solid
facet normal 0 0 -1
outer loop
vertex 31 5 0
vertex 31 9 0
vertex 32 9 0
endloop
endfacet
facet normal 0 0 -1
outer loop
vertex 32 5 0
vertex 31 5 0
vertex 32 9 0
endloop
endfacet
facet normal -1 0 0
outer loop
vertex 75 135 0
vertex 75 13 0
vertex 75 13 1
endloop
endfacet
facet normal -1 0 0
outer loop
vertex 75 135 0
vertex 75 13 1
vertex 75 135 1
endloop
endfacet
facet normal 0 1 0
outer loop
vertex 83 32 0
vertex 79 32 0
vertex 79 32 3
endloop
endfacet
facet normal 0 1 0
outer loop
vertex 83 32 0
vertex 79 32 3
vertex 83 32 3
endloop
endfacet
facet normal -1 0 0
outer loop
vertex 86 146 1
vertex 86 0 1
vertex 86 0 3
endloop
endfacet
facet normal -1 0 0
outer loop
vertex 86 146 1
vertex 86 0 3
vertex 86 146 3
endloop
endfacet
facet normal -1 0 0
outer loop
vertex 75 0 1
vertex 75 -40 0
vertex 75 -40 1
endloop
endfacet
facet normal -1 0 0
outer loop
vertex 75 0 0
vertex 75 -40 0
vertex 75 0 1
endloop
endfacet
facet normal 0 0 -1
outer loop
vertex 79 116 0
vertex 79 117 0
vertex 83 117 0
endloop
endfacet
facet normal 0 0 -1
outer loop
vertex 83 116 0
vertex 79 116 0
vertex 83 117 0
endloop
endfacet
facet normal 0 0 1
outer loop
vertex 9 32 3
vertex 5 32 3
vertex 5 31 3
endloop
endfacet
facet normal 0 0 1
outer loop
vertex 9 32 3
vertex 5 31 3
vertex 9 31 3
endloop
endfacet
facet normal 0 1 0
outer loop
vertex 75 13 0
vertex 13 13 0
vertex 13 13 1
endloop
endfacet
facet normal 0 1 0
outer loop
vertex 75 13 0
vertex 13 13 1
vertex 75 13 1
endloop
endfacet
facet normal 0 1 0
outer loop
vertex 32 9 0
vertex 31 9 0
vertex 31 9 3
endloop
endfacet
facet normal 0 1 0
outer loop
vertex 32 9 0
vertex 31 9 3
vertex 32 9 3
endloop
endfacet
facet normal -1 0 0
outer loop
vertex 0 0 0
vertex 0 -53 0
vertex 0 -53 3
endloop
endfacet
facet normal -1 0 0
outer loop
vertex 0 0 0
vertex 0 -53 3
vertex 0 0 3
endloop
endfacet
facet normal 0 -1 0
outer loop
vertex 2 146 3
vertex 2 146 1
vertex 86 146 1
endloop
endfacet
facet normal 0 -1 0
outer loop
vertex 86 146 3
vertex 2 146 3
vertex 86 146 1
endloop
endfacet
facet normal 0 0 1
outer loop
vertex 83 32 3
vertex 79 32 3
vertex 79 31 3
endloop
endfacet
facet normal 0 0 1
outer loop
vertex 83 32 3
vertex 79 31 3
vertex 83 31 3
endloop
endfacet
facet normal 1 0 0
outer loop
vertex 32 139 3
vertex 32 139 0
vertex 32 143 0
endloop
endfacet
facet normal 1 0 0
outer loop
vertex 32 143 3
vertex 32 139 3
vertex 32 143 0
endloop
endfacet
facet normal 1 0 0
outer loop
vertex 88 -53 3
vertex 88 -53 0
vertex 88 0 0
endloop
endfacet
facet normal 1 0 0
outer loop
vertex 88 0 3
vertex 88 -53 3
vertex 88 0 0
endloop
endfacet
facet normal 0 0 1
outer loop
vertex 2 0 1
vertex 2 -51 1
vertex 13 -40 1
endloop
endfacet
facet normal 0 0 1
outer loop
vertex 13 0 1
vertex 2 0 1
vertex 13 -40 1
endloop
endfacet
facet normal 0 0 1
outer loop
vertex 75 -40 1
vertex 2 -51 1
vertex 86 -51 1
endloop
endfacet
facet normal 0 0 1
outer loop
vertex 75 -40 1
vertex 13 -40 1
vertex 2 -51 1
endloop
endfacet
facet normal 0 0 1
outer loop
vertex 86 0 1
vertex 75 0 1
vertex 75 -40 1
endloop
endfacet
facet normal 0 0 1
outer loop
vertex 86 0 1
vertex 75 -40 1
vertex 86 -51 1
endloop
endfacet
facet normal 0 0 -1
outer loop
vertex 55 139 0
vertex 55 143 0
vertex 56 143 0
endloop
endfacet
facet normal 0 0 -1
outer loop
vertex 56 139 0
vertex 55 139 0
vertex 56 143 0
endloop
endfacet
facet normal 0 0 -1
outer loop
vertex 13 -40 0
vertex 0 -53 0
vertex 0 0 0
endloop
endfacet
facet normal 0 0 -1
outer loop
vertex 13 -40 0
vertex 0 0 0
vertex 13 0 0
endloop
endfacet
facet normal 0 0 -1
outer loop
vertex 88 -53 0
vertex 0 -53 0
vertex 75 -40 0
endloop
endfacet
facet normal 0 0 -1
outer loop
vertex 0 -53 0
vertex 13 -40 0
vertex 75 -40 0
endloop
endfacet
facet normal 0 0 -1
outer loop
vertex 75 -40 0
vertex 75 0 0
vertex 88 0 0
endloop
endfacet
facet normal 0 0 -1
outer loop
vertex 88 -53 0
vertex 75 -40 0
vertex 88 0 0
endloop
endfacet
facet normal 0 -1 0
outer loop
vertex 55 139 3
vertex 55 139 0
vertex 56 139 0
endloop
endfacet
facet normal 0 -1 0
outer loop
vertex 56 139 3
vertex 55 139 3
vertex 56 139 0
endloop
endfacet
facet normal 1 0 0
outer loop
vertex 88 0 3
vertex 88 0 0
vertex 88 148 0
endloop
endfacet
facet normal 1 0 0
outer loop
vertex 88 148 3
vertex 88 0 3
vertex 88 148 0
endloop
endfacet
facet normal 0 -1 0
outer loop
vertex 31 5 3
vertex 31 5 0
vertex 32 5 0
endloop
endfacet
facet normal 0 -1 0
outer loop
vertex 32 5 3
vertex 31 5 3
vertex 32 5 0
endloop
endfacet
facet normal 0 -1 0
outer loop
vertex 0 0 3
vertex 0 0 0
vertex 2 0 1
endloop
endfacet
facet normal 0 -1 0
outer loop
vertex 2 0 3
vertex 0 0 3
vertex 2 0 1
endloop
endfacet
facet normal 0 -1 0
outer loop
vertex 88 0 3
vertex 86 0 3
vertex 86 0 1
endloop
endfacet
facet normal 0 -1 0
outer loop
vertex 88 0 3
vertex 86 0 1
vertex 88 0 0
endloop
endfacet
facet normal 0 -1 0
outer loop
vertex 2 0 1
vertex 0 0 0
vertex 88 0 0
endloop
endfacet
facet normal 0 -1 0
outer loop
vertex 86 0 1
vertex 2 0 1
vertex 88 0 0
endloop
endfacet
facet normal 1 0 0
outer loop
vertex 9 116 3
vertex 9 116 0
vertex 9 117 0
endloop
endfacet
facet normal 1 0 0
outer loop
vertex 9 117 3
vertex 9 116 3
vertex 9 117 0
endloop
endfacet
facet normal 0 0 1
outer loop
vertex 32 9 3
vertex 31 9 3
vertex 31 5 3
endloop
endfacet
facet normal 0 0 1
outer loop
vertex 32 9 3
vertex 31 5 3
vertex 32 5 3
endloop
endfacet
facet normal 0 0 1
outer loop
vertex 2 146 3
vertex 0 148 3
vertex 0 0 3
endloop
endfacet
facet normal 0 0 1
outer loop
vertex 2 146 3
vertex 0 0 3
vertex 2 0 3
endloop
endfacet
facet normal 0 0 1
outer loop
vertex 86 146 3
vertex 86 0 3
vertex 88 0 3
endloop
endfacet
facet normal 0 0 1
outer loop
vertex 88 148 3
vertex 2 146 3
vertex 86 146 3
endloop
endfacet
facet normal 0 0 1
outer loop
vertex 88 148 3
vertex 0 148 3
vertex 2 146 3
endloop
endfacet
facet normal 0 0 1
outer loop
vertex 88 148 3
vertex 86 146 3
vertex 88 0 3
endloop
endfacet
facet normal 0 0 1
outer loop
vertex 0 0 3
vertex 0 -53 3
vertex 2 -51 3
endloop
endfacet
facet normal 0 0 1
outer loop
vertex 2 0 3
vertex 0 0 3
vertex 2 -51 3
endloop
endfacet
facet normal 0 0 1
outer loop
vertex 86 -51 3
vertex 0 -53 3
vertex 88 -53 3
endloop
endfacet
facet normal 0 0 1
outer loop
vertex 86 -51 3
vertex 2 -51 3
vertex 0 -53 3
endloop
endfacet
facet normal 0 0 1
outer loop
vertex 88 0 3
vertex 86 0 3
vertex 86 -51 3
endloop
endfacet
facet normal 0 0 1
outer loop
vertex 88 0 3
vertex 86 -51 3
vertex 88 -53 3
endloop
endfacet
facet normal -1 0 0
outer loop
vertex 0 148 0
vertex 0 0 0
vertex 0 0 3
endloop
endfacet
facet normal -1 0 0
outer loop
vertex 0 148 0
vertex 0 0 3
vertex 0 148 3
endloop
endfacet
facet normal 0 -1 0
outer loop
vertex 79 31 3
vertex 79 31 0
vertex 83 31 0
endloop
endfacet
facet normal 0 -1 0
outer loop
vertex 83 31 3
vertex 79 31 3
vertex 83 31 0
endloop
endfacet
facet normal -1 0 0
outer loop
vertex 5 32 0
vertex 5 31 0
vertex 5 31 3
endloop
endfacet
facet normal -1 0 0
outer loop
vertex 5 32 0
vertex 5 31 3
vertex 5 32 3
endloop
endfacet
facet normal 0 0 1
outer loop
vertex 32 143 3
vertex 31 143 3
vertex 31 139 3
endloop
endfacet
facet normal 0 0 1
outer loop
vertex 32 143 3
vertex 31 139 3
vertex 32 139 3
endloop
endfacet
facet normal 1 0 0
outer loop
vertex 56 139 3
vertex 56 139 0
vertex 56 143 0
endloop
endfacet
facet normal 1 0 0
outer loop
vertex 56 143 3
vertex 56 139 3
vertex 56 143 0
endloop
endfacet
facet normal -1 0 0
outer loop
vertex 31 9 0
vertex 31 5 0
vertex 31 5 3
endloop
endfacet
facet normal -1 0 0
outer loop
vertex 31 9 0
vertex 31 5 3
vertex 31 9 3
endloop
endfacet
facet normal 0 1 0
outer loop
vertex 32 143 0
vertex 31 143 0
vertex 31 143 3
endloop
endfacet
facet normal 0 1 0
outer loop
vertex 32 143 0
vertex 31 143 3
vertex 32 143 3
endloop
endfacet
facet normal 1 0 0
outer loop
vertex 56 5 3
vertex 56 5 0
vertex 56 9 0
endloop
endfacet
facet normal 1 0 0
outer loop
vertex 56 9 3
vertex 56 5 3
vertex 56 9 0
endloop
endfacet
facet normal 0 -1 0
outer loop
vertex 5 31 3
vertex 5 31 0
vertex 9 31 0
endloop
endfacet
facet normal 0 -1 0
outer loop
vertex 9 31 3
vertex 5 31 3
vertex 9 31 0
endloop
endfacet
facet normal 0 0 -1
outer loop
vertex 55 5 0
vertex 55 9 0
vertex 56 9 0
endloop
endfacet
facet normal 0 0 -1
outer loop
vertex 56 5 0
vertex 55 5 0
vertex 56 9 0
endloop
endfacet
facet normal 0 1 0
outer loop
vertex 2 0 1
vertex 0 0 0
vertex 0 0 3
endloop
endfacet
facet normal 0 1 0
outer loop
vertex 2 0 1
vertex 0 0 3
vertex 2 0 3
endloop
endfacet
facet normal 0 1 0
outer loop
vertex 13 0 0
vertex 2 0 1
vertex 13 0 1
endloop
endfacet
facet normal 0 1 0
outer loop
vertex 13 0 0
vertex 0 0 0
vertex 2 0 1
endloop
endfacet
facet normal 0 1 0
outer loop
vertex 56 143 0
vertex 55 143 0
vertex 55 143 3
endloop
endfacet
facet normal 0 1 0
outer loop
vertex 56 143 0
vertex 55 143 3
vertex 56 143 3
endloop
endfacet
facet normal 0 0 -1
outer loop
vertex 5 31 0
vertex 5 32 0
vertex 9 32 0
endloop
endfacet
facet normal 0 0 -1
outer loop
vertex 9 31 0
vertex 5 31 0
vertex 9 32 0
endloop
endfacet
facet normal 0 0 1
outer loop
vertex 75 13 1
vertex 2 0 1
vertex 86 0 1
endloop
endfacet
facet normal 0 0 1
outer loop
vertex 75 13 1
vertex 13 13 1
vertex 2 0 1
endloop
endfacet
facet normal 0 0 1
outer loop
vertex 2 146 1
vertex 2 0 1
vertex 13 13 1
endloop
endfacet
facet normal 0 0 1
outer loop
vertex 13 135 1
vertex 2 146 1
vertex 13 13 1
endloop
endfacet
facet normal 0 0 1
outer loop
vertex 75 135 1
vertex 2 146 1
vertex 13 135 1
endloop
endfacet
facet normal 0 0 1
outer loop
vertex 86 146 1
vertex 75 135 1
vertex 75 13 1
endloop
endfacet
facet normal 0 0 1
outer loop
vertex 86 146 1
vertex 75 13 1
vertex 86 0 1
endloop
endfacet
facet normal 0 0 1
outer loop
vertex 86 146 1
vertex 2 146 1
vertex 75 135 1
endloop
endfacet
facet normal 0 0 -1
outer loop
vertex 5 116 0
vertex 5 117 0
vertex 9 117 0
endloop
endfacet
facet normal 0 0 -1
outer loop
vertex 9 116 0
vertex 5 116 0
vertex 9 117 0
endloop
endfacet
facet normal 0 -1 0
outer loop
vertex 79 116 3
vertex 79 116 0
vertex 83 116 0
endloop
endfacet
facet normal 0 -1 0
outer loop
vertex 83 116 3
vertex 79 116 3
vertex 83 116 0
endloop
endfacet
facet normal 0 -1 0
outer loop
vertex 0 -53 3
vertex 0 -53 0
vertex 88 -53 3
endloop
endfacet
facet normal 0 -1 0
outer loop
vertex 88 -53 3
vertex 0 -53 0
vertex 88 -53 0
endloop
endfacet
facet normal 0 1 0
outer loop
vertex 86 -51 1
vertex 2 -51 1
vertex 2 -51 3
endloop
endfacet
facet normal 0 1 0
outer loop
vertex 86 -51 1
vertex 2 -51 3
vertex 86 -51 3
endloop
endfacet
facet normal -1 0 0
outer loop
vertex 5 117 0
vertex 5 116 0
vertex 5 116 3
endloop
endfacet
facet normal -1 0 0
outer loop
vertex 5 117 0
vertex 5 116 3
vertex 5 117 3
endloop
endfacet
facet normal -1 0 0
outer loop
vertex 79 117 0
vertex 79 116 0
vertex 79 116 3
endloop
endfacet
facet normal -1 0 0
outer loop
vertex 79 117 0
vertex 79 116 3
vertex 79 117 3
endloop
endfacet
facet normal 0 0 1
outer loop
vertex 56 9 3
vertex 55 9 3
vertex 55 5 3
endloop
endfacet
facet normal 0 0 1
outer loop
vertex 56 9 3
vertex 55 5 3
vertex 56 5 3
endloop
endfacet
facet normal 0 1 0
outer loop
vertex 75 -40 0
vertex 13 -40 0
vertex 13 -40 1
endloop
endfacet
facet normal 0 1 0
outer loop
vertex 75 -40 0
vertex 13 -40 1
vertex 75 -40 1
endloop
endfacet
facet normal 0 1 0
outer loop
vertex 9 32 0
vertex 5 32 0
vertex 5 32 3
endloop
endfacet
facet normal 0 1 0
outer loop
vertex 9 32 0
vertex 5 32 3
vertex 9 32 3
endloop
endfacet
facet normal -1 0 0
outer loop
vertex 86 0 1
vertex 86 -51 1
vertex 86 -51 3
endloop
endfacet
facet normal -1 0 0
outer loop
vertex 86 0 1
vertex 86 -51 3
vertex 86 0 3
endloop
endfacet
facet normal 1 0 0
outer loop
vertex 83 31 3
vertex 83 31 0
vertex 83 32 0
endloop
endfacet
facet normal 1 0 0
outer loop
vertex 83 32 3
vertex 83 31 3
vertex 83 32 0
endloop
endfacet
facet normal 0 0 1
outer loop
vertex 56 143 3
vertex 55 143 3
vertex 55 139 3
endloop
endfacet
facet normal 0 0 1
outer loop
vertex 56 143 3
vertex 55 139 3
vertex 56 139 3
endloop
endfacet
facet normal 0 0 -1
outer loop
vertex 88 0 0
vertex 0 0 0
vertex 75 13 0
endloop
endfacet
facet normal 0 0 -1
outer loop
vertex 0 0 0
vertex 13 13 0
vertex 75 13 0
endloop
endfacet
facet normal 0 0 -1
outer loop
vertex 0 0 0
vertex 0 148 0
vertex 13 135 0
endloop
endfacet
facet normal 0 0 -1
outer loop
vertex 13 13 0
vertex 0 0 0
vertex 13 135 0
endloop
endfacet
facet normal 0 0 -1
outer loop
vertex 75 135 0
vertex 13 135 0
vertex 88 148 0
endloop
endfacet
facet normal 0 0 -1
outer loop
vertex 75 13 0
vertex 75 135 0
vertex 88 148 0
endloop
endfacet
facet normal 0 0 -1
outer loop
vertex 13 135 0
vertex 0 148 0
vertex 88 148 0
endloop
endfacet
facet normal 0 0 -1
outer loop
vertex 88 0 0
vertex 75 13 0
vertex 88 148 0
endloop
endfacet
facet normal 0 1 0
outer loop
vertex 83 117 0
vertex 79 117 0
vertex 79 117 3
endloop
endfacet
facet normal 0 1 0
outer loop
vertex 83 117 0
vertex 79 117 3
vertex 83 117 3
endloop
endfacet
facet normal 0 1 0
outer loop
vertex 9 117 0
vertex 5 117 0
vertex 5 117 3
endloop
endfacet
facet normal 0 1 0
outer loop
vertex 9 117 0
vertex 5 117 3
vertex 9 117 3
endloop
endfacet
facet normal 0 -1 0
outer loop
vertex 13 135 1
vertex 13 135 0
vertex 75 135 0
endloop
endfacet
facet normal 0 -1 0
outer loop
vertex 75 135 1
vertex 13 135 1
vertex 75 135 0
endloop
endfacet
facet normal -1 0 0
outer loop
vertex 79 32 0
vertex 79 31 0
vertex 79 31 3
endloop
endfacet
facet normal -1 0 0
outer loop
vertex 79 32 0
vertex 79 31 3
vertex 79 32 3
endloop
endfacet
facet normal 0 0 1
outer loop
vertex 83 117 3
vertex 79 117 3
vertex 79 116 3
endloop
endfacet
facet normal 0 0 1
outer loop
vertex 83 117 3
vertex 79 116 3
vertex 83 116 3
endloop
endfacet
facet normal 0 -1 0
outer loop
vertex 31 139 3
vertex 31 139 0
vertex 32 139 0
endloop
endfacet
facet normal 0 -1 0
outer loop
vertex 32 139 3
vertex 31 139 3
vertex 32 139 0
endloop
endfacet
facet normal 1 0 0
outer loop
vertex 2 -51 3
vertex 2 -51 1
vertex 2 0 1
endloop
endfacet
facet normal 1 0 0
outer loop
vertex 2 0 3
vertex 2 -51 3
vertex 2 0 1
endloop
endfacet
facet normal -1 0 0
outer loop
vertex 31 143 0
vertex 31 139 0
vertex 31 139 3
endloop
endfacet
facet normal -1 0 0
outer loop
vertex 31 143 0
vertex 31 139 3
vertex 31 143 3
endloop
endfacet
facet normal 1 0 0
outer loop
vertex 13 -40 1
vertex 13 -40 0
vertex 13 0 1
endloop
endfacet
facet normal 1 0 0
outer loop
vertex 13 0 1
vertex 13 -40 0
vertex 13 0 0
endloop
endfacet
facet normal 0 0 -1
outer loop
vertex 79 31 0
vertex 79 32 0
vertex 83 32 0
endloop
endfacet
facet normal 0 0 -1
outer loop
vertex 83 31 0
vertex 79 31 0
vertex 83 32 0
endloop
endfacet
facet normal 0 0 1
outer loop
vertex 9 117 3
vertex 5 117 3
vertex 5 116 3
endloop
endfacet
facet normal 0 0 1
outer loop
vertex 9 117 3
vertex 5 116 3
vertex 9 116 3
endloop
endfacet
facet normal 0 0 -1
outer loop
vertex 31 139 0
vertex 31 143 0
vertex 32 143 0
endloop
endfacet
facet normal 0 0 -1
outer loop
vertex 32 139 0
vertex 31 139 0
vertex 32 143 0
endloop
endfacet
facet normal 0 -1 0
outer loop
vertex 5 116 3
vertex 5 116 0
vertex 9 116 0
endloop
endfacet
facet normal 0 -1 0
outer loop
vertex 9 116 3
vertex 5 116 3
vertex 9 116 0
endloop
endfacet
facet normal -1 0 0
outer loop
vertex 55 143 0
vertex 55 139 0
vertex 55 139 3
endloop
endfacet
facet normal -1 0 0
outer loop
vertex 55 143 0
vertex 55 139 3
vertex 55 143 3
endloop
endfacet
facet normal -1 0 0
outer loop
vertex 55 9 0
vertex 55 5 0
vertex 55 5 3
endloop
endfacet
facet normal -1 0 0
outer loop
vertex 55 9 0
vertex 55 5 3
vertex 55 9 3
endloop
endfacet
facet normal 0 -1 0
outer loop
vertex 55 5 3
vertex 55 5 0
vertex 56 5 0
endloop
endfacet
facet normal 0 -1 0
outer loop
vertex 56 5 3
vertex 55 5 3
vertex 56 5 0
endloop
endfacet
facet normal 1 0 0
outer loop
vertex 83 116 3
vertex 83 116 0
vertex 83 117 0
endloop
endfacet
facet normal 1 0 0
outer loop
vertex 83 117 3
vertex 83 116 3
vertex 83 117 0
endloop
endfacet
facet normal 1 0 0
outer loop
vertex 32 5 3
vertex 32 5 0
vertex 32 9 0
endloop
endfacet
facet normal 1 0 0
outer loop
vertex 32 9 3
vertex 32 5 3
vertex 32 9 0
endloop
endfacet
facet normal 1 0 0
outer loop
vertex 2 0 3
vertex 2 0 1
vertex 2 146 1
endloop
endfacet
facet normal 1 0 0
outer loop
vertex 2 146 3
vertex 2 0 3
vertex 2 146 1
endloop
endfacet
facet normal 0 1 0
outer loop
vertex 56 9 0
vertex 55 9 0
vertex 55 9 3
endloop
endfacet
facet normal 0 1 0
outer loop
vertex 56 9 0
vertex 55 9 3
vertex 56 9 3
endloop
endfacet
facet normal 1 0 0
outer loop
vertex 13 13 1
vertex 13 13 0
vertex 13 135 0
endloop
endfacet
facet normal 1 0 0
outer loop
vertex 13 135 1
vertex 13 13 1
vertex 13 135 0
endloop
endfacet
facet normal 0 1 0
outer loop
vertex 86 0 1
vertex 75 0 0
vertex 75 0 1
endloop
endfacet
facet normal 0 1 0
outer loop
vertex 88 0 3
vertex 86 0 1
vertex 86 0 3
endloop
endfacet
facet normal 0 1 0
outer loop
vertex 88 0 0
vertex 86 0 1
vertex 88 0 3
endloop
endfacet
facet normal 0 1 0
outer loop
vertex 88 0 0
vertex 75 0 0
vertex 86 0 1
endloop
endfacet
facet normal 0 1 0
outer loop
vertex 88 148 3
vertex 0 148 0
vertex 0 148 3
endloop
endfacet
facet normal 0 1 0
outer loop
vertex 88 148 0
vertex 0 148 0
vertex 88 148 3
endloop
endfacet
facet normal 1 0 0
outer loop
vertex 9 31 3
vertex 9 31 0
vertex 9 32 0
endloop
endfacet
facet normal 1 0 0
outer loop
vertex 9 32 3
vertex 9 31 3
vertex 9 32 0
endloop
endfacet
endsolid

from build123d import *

# Parameters (mm, degrees)
BOX003_W     = 4
BOX003_H     = 1
BOX003_DEPTH = 3
BOX004_W     = 4
BOX004_H     = 1
BOX004_DEPTH = 3
BOX005_W     = 4
BOX005_H     = 1
BOX005_DEPTH = 3
BOX006_W     = 4
BOX006_H     = 1
BOX006_DEPTH = 3
BOX007_W     = 1
BOX007_H     = 4
BOX007_DEPTH = 3
BOX008_W     = 1
BOX008_H     = 4
BOX008_DEPTH = 3
BOX009_W     = 1
BOX009_H     = 4
BOX009_DEPTH = 3
BOX010_W     = 1
BOX010_H     = 4
BOX010_DEPTH = 3
BOX012_W     = 84
BOX012_H     = 53
BOX012_DEPTH = 2
BOX002_W     = 84
BOX002_H     = 144
BOX002_DEPTH = 2
BOX001_W     = 62
BOX001_H     = 122
BOX001_DEPTH = 3
BOX_W        = 88
BOX_H        = 148
BOX_DEPTH    = 3
BOX013_W     = 62
BOX013_H     = 40
BOX013_DEPTH = 3
BOX011_W     = 88
BOX011_H     = 53
BOX011_DEPTH = 3


with BuildPart() as cube003:
    # Box003 → Box003 (new body)
    with BuildSketch(Plane(origin=(5, 31, 0), x_dir=(1, 0, 0), z_dir=(0, 0, 1))):
        with Locations((2, 0.5)):
            Rectangle(BOX003_W, BOX003_H)
    extrude(amount=BOX003_DEPTH)


with BuildPart() as cube004:
    # Box004 → Box004 (new body)
    with BuildSketch(Plane(origin=(79, 31, 0), x_dir=(1, 0, 0), z_dir=(0, 0, 1))):
        with Locations((2, 0.5)):
            Rectangle(BOX004_W, BOX004_H)
    extrude(amount=BOX004_DEPTH)


with BuildPart() as cube005:
    # Box005 → Box005 (new body)
    with BuildSketch(Plane(origin=(5, 116, 0), x_dir=(1, 0, 0), z_dir=(0, 0, 1))):
        with Locations((2, 0.5)):
            Rectangle(BOX005_W, BOX005_H)
    extrude(amount=BOX005_DEPTH)


with BuildPart() as cube006:
    # Box006 → Box006 (new body)
    with BuildSketch(Plane(origin=(79, 116, 0), x_dir=(1, 0, 0), z_dir=(0, 0, 1))):
        with Locations((2, 0.5)):
            Rectangle(BOX006_W, BOX006_H)
    extrude(amount=BOX006_DEPTH)


with BuildPart() as cube007:
    # Box007 → Box007 (new body)
    with BuildSketch(Plane(origin=(31, 5, 0), x_dir=(1, 0, 0), z_dir=(0, 0, 1))):
        with Locations((0.5, 2)):
            Rectangle(BOX007_W, BOX007_H)
    extrude(amount=BOX007_DEPTH)


with BuildPart() as cube008:
    # Box008 → Box008 (new body)
    with BuildSketch(Plane(origin=(55, 5, 0), x_dir=(1, 0, 0), z_dir=(0, 0, 1))):
        with Locations((0.5, 2)):
            Rectangle(BOX008_W, BOX008_H)
    extrude(amount=BOX008_DEPTH)


with BuildPart() as cube009:
    # Box009 → Box009 (new body)
    with BuildSketch(Plane(origin=(31, 139, 0), x_dir=(1, 0, 0), z_dir=(0, 0, 1))):
        with Locations((0.5, 2)):
            Rectangle(BOX009_W, BOX009_H)
    extrude(amount=BOX009_DEPTH)


with BuildPart() as cube010:
    # Box010 → Box010 (new body)
    with BuildSketch(Plane(origin=(55, 139, 0), x_dir=(1, 0, 0), z_dir=(0, 0, 1))):
        with Locations((0.5, 2)):
            Rectangle(BOX010_W, BOX010_H)
    extrude(amount=BOX010_DEPTH)


with BuildPart() as cube012:
    # Box012 → Box012 (new body)
    with BuildSketch(Plane(origin=(2, -51, 1), x_dir=(1, 0, 0), z_dir=(0, 0, 1))):
        with Locations((42, 26.5)):
            Rectangle(BOX012_W, BOX012_H)
    extrude(amount=BOX012_DEPTH)


with BuildPart() as cube002:
    # Box002 → Box002 (new body)
    with BuildSketch(Plane(origin=(2, 2, 1), x_dir=(1, 0, 0), z_dir=(0, 0, 1))):
        with Locations((42, 72)):
            Rectangle(BOX002_W, BOX002_H)
    extrude(amount=BOX002_DEPTH)


with BuildPart() as cube001:
    # Box001 → Box001 (new body)
    with BuildSketch(Plane(origin=(13, 13, 0), x_dir=(1, 0, 0), z_dir=(0, 0, 1))):
        with Locations((31, 61)):
            Rectangle(BOX001_W, BOX001_H)
    extrude(amount=BOX001_DEPTH)


with BuildPart() as cut003:
    # Box → Box (new body)
    with BuildSketch(Plane.XY):
        with Locations((44, 74)):
            Rectangle(BOX_W, BOX_H)
    extrude(amount=BOX_DEPTH)

    # Cut: cut Cube001
    add(cube001.part, mode=Mode.SUBTRACT)

    # Cut001: cut Cube002
    add(cube002.part, mode=Mode.SUBTRACT)

    # Cut003: cut Cube012
    add(cube012.part, mode=Mode.SUBTRACT)


with BuildPart() as cube013:
    # Box013 → Box013 (new body)
    with BuildSketch(Plane(origin=(13, -40, 0), x_dir=(1, 0, 0), z_dir=(0, 0, 1))):
        with Locations((31, 20)):
            Rectangle(BOX013_W, BOX013_H)
    extrude(amount=BOX013_DEPTH)


with BuildPart() as cut004:
    # Box011 → Box011 (new body)
    with BuildSketch(Plane(origin=(0, -53, 0), x_dir=(1, 0, 0), z_dir=(0, 0, 1))):
        with Locations((44, 26.5)):
            Rectangle(BOX011_W, BOX011_H)
    extrude(amount=BOX011_DEPTH)

    # Cut002: cut Cube012
    add(cube012.part, mode=Mode.SUBTRACT)

    # Cut004: cut Cube013
    add(cube013.part, mode=Mode.SUBTRACT)


solid = Compound([cube003.part, cube004.part, cube005.part, cube006.part, cube007.part, cube008.part, cube009.part, cube010.part, cut003.part, cut004.part])
